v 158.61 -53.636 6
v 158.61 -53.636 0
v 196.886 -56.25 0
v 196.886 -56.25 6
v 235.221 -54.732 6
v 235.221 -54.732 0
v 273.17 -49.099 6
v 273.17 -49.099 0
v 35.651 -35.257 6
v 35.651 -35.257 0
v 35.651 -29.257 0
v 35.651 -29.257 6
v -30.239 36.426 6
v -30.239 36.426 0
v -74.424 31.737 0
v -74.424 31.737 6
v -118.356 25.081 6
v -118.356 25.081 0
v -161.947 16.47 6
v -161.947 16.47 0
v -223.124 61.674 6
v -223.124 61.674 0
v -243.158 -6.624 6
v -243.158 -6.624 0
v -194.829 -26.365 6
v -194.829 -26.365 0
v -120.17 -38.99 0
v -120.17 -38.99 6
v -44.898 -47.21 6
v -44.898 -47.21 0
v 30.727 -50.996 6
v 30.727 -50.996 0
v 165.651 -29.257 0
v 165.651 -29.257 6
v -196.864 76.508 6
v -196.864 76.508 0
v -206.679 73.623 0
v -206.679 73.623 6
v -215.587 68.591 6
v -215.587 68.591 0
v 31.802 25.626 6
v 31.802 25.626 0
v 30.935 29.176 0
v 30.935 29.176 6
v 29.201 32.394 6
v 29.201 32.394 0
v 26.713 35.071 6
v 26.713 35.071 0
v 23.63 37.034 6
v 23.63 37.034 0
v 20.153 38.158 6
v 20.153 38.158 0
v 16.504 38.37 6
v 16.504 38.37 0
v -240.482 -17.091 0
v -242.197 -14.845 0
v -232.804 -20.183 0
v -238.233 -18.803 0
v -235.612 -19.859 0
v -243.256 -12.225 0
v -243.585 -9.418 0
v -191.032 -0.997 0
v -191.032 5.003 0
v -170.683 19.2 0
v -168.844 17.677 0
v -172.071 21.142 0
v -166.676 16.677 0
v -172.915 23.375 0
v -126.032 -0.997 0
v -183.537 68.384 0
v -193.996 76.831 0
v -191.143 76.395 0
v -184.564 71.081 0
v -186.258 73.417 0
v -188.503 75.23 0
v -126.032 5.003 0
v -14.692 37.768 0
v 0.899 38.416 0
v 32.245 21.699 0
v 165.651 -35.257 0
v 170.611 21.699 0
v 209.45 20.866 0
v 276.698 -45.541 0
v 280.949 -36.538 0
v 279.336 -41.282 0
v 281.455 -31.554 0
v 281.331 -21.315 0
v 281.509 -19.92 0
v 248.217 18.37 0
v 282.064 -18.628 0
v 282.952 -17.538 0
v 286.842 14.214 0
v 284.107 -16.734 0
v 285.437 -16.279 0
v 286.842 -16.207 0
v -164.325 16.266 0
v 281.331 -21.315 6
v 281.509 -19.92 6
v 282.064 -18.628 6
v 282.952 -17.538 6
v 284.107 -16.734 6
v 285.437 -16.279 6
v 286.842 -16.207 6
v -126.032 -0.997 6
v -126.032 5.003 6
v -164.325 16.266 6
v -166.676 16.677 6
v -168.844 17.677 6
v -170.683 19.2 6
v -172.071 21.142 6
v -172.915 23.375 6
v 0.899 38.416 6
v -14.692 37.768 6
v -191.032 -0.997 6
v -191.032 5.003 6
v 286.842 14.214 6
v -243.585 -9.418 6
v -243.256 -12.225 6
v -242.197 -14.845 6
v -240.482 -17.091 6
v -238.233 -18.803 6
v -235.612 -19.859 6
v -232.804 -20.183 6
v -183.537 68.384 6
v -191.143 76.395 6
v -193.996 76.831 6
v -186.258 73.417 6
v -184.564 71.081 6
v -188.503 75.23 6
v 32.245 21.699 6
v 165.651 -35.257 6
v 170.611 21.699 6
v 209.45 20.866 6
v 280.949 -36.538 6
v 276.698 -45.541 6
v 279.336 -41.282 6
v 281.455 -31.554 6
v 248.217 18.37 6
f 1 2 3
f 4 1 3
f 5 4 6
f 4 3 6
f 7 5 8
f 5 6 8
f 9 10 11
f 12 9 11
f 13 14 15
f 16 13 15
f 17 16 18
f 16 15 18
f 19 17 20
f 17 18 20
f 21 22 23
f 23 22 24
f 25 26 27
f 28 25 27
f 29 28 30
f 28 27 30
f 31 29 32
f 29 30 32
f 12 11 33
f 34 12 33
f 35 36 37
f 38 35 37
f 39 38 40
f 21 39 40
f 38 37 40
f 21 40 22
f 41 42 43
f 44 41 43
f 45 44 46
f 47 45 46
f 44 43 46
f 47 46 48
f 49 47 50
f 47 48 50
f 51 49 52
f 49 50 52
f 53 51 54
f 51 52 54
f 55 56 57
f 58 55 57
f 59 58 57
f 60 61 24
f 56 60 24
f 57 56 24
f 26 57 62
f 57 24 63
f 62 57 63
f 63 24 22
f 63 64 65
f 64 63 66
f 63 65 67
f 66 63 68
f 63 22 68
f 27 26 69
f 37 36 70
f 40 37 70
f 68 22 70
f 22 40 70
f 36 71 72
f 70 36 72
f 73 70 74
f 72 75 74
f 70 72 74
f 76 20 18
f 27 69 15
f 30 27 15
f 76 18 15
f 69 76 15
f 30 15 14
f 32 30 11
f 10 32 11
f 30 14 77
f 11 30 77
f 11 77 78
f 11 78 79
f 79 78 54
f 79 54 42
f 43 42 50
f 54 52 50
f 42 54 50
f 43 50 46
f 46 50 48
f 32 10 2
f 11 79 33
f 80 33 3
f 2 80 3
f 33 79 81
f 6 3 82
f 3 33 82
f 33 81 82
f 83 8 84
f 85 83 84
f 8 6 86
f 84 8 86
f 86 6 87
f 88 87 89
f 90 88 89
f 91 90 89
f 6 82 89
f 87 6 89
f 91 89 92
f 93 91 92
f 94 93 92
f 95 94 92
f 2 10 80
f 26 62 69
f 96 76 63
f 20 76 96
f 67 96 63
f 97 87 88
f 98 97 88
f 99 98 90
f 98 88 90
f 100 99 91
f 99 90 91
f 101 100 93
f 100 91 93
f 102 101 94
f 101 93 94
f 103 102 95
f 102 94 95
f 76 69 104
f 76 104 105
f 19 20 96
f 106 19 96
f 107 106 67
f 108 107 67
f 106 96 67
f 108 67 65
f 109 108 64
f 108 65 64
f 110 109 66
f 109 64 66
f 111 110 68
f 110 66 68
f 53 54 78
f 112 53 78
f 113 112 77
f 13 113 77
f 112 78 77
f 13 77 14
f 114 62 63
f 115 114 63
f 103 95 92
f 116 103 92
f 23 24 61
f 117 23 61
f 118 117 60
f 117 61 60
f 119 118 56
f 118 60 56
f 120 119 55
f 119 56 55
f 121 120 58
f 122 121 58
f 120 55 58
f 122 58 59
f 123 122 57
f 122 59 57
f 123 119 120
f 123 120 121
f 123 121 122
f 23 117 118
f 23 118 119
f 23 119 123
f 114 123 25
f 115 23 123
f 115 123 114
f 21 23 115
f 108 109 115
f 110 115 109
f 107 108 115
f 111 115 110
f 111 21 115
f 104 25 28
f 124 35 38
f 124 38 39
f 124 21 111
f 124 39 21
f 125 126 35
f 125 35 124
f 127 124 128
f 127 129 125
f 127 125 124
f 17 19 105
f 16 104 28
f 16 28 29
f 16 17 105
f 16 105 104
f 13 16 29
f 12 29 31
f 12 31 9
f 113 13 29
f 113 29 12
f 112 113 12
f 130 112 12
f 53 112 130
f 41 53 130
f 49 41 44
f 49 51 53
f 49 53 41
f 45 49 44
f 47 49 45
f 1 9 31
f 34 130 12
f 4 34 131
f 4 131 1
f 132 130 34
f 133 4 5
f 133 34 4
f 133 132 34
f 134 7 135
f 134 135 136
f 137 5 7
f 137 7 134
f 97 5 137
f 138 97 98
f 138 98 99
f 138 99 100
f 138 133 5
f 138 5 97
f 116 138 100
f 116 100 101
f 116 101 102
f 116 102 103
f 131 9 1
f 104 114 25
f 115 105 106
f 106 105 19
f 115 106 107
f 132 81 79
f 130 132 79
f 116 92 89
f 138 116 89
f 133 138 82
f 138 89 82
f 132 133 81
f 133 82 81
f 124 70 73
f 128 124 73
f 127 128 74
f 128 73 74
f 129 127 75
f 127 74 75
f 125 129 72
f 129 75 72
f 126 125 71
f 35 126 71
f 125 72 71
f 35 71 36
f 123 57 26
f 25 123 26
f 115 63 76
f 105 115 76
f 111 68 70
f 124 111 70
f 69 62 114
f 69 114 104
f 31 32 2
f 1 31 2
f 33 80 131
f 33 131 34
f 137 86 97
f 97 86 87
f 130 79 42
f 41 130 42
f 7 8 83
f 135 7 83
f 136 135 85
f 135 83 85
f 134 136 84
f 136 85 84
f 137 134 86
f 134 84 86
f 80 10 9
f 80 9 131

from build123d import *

# Parameters (mm, degrees)
F0_W     = 65
F0_H     = 6
F0_W_2   = 130
F1_DEPTH = 6


with BuildPart() as f1:
    # F0 (on Top) → F1 (new body)
    with BuildSketch(Plane.XY):
        with BuildLine():
            Line((-172.914558, 23.37498), (-183.537395, 68.384158))
            ThreePointArc((-183.537395, 68.384158), (-188.503299, 75.22998), (-196.863512, 76.507601))
            ThreePointArc((-196.863512, 76.507601), (-211.276495, 71.361563), (-223.12419, 61.674048))
            Line((-223.12419, 61.674048), (-243.158294, -6.624031))
            Line((-243.158294, -6.624031), (286.841706, -6.624031))
            Line((286.841706, -6.624031), (286.841706, 14.214297))
            ThreePointArc((286.841706, 14.214297), (228.846641, 19.825852), (170.610839, 21.698951))
            Line((170.610839, 21.698951), (32.24461, 21.698951))
            Line((32.24461, 21.698951), (31.802109, 25.625584))
            ThreePointArc((31.802109, 25.625584), (26.712862, 35.070635), (16.50378, 38.369733))
            ThreePointArc((16.50378, 38.369733), (-6.900195, 38.178785), (-30.239211, 36.425835))
            ThreePointArc((-30.239211, 36.425835), (-96.427228, 28.654331), (-161.946659, 16.470163))
            ThreePointArc((-161.946659, 16.470163), (-168.84401, 17.677466), (-172.914558, 23.37498))
        make_face()
        with Locations((-158.532006, 2.002824)):
            Rectangle(F0_W, F0_H, mode=Mode.SUBTRACT)
        with BuildLine():
            Line((286.841706, -6.624031), (-243.158294, -6.624031))
            ThreePointArc((-243.158294, -6.624031), (-241.41439, -16.025181), (-232.804301, -20.183209))
            Line((-232.804301, -20.183209), (-194.829215, -26.364981))
            ThreePointArc((-194.829215, -26.364981), (-82.594257, -43.652901), (30.72672, -50.995535))
            Line((30.72672, -50.995535), (158.609955, -53.635519))
            ThreePointArc((158.609955, -53.635519), (216.073845, -56.007438), (273.170183, -49.09854))
            ThreePointArc((273.170183, -49.09854), (279.335818, -41.281654), (281.455098, -31.553993))
            Line((281.455098, -31.553993), (281.330585, -21.315108))
            ThreePointArc((281.330585, -21.315108), (282.952438, -17.537773), (286.841706, -16.206507))
            Line((286.841706, -16.206507), (286.841706, -6.624031))
        make_face()
        with Locations((100.650969, -32.257092)):
            Rectangle(F0_W_2, F0_H, mode=Mode.SUBTRACT)
    extrude(amount=F1_DEPTH)


solid = f1.part
